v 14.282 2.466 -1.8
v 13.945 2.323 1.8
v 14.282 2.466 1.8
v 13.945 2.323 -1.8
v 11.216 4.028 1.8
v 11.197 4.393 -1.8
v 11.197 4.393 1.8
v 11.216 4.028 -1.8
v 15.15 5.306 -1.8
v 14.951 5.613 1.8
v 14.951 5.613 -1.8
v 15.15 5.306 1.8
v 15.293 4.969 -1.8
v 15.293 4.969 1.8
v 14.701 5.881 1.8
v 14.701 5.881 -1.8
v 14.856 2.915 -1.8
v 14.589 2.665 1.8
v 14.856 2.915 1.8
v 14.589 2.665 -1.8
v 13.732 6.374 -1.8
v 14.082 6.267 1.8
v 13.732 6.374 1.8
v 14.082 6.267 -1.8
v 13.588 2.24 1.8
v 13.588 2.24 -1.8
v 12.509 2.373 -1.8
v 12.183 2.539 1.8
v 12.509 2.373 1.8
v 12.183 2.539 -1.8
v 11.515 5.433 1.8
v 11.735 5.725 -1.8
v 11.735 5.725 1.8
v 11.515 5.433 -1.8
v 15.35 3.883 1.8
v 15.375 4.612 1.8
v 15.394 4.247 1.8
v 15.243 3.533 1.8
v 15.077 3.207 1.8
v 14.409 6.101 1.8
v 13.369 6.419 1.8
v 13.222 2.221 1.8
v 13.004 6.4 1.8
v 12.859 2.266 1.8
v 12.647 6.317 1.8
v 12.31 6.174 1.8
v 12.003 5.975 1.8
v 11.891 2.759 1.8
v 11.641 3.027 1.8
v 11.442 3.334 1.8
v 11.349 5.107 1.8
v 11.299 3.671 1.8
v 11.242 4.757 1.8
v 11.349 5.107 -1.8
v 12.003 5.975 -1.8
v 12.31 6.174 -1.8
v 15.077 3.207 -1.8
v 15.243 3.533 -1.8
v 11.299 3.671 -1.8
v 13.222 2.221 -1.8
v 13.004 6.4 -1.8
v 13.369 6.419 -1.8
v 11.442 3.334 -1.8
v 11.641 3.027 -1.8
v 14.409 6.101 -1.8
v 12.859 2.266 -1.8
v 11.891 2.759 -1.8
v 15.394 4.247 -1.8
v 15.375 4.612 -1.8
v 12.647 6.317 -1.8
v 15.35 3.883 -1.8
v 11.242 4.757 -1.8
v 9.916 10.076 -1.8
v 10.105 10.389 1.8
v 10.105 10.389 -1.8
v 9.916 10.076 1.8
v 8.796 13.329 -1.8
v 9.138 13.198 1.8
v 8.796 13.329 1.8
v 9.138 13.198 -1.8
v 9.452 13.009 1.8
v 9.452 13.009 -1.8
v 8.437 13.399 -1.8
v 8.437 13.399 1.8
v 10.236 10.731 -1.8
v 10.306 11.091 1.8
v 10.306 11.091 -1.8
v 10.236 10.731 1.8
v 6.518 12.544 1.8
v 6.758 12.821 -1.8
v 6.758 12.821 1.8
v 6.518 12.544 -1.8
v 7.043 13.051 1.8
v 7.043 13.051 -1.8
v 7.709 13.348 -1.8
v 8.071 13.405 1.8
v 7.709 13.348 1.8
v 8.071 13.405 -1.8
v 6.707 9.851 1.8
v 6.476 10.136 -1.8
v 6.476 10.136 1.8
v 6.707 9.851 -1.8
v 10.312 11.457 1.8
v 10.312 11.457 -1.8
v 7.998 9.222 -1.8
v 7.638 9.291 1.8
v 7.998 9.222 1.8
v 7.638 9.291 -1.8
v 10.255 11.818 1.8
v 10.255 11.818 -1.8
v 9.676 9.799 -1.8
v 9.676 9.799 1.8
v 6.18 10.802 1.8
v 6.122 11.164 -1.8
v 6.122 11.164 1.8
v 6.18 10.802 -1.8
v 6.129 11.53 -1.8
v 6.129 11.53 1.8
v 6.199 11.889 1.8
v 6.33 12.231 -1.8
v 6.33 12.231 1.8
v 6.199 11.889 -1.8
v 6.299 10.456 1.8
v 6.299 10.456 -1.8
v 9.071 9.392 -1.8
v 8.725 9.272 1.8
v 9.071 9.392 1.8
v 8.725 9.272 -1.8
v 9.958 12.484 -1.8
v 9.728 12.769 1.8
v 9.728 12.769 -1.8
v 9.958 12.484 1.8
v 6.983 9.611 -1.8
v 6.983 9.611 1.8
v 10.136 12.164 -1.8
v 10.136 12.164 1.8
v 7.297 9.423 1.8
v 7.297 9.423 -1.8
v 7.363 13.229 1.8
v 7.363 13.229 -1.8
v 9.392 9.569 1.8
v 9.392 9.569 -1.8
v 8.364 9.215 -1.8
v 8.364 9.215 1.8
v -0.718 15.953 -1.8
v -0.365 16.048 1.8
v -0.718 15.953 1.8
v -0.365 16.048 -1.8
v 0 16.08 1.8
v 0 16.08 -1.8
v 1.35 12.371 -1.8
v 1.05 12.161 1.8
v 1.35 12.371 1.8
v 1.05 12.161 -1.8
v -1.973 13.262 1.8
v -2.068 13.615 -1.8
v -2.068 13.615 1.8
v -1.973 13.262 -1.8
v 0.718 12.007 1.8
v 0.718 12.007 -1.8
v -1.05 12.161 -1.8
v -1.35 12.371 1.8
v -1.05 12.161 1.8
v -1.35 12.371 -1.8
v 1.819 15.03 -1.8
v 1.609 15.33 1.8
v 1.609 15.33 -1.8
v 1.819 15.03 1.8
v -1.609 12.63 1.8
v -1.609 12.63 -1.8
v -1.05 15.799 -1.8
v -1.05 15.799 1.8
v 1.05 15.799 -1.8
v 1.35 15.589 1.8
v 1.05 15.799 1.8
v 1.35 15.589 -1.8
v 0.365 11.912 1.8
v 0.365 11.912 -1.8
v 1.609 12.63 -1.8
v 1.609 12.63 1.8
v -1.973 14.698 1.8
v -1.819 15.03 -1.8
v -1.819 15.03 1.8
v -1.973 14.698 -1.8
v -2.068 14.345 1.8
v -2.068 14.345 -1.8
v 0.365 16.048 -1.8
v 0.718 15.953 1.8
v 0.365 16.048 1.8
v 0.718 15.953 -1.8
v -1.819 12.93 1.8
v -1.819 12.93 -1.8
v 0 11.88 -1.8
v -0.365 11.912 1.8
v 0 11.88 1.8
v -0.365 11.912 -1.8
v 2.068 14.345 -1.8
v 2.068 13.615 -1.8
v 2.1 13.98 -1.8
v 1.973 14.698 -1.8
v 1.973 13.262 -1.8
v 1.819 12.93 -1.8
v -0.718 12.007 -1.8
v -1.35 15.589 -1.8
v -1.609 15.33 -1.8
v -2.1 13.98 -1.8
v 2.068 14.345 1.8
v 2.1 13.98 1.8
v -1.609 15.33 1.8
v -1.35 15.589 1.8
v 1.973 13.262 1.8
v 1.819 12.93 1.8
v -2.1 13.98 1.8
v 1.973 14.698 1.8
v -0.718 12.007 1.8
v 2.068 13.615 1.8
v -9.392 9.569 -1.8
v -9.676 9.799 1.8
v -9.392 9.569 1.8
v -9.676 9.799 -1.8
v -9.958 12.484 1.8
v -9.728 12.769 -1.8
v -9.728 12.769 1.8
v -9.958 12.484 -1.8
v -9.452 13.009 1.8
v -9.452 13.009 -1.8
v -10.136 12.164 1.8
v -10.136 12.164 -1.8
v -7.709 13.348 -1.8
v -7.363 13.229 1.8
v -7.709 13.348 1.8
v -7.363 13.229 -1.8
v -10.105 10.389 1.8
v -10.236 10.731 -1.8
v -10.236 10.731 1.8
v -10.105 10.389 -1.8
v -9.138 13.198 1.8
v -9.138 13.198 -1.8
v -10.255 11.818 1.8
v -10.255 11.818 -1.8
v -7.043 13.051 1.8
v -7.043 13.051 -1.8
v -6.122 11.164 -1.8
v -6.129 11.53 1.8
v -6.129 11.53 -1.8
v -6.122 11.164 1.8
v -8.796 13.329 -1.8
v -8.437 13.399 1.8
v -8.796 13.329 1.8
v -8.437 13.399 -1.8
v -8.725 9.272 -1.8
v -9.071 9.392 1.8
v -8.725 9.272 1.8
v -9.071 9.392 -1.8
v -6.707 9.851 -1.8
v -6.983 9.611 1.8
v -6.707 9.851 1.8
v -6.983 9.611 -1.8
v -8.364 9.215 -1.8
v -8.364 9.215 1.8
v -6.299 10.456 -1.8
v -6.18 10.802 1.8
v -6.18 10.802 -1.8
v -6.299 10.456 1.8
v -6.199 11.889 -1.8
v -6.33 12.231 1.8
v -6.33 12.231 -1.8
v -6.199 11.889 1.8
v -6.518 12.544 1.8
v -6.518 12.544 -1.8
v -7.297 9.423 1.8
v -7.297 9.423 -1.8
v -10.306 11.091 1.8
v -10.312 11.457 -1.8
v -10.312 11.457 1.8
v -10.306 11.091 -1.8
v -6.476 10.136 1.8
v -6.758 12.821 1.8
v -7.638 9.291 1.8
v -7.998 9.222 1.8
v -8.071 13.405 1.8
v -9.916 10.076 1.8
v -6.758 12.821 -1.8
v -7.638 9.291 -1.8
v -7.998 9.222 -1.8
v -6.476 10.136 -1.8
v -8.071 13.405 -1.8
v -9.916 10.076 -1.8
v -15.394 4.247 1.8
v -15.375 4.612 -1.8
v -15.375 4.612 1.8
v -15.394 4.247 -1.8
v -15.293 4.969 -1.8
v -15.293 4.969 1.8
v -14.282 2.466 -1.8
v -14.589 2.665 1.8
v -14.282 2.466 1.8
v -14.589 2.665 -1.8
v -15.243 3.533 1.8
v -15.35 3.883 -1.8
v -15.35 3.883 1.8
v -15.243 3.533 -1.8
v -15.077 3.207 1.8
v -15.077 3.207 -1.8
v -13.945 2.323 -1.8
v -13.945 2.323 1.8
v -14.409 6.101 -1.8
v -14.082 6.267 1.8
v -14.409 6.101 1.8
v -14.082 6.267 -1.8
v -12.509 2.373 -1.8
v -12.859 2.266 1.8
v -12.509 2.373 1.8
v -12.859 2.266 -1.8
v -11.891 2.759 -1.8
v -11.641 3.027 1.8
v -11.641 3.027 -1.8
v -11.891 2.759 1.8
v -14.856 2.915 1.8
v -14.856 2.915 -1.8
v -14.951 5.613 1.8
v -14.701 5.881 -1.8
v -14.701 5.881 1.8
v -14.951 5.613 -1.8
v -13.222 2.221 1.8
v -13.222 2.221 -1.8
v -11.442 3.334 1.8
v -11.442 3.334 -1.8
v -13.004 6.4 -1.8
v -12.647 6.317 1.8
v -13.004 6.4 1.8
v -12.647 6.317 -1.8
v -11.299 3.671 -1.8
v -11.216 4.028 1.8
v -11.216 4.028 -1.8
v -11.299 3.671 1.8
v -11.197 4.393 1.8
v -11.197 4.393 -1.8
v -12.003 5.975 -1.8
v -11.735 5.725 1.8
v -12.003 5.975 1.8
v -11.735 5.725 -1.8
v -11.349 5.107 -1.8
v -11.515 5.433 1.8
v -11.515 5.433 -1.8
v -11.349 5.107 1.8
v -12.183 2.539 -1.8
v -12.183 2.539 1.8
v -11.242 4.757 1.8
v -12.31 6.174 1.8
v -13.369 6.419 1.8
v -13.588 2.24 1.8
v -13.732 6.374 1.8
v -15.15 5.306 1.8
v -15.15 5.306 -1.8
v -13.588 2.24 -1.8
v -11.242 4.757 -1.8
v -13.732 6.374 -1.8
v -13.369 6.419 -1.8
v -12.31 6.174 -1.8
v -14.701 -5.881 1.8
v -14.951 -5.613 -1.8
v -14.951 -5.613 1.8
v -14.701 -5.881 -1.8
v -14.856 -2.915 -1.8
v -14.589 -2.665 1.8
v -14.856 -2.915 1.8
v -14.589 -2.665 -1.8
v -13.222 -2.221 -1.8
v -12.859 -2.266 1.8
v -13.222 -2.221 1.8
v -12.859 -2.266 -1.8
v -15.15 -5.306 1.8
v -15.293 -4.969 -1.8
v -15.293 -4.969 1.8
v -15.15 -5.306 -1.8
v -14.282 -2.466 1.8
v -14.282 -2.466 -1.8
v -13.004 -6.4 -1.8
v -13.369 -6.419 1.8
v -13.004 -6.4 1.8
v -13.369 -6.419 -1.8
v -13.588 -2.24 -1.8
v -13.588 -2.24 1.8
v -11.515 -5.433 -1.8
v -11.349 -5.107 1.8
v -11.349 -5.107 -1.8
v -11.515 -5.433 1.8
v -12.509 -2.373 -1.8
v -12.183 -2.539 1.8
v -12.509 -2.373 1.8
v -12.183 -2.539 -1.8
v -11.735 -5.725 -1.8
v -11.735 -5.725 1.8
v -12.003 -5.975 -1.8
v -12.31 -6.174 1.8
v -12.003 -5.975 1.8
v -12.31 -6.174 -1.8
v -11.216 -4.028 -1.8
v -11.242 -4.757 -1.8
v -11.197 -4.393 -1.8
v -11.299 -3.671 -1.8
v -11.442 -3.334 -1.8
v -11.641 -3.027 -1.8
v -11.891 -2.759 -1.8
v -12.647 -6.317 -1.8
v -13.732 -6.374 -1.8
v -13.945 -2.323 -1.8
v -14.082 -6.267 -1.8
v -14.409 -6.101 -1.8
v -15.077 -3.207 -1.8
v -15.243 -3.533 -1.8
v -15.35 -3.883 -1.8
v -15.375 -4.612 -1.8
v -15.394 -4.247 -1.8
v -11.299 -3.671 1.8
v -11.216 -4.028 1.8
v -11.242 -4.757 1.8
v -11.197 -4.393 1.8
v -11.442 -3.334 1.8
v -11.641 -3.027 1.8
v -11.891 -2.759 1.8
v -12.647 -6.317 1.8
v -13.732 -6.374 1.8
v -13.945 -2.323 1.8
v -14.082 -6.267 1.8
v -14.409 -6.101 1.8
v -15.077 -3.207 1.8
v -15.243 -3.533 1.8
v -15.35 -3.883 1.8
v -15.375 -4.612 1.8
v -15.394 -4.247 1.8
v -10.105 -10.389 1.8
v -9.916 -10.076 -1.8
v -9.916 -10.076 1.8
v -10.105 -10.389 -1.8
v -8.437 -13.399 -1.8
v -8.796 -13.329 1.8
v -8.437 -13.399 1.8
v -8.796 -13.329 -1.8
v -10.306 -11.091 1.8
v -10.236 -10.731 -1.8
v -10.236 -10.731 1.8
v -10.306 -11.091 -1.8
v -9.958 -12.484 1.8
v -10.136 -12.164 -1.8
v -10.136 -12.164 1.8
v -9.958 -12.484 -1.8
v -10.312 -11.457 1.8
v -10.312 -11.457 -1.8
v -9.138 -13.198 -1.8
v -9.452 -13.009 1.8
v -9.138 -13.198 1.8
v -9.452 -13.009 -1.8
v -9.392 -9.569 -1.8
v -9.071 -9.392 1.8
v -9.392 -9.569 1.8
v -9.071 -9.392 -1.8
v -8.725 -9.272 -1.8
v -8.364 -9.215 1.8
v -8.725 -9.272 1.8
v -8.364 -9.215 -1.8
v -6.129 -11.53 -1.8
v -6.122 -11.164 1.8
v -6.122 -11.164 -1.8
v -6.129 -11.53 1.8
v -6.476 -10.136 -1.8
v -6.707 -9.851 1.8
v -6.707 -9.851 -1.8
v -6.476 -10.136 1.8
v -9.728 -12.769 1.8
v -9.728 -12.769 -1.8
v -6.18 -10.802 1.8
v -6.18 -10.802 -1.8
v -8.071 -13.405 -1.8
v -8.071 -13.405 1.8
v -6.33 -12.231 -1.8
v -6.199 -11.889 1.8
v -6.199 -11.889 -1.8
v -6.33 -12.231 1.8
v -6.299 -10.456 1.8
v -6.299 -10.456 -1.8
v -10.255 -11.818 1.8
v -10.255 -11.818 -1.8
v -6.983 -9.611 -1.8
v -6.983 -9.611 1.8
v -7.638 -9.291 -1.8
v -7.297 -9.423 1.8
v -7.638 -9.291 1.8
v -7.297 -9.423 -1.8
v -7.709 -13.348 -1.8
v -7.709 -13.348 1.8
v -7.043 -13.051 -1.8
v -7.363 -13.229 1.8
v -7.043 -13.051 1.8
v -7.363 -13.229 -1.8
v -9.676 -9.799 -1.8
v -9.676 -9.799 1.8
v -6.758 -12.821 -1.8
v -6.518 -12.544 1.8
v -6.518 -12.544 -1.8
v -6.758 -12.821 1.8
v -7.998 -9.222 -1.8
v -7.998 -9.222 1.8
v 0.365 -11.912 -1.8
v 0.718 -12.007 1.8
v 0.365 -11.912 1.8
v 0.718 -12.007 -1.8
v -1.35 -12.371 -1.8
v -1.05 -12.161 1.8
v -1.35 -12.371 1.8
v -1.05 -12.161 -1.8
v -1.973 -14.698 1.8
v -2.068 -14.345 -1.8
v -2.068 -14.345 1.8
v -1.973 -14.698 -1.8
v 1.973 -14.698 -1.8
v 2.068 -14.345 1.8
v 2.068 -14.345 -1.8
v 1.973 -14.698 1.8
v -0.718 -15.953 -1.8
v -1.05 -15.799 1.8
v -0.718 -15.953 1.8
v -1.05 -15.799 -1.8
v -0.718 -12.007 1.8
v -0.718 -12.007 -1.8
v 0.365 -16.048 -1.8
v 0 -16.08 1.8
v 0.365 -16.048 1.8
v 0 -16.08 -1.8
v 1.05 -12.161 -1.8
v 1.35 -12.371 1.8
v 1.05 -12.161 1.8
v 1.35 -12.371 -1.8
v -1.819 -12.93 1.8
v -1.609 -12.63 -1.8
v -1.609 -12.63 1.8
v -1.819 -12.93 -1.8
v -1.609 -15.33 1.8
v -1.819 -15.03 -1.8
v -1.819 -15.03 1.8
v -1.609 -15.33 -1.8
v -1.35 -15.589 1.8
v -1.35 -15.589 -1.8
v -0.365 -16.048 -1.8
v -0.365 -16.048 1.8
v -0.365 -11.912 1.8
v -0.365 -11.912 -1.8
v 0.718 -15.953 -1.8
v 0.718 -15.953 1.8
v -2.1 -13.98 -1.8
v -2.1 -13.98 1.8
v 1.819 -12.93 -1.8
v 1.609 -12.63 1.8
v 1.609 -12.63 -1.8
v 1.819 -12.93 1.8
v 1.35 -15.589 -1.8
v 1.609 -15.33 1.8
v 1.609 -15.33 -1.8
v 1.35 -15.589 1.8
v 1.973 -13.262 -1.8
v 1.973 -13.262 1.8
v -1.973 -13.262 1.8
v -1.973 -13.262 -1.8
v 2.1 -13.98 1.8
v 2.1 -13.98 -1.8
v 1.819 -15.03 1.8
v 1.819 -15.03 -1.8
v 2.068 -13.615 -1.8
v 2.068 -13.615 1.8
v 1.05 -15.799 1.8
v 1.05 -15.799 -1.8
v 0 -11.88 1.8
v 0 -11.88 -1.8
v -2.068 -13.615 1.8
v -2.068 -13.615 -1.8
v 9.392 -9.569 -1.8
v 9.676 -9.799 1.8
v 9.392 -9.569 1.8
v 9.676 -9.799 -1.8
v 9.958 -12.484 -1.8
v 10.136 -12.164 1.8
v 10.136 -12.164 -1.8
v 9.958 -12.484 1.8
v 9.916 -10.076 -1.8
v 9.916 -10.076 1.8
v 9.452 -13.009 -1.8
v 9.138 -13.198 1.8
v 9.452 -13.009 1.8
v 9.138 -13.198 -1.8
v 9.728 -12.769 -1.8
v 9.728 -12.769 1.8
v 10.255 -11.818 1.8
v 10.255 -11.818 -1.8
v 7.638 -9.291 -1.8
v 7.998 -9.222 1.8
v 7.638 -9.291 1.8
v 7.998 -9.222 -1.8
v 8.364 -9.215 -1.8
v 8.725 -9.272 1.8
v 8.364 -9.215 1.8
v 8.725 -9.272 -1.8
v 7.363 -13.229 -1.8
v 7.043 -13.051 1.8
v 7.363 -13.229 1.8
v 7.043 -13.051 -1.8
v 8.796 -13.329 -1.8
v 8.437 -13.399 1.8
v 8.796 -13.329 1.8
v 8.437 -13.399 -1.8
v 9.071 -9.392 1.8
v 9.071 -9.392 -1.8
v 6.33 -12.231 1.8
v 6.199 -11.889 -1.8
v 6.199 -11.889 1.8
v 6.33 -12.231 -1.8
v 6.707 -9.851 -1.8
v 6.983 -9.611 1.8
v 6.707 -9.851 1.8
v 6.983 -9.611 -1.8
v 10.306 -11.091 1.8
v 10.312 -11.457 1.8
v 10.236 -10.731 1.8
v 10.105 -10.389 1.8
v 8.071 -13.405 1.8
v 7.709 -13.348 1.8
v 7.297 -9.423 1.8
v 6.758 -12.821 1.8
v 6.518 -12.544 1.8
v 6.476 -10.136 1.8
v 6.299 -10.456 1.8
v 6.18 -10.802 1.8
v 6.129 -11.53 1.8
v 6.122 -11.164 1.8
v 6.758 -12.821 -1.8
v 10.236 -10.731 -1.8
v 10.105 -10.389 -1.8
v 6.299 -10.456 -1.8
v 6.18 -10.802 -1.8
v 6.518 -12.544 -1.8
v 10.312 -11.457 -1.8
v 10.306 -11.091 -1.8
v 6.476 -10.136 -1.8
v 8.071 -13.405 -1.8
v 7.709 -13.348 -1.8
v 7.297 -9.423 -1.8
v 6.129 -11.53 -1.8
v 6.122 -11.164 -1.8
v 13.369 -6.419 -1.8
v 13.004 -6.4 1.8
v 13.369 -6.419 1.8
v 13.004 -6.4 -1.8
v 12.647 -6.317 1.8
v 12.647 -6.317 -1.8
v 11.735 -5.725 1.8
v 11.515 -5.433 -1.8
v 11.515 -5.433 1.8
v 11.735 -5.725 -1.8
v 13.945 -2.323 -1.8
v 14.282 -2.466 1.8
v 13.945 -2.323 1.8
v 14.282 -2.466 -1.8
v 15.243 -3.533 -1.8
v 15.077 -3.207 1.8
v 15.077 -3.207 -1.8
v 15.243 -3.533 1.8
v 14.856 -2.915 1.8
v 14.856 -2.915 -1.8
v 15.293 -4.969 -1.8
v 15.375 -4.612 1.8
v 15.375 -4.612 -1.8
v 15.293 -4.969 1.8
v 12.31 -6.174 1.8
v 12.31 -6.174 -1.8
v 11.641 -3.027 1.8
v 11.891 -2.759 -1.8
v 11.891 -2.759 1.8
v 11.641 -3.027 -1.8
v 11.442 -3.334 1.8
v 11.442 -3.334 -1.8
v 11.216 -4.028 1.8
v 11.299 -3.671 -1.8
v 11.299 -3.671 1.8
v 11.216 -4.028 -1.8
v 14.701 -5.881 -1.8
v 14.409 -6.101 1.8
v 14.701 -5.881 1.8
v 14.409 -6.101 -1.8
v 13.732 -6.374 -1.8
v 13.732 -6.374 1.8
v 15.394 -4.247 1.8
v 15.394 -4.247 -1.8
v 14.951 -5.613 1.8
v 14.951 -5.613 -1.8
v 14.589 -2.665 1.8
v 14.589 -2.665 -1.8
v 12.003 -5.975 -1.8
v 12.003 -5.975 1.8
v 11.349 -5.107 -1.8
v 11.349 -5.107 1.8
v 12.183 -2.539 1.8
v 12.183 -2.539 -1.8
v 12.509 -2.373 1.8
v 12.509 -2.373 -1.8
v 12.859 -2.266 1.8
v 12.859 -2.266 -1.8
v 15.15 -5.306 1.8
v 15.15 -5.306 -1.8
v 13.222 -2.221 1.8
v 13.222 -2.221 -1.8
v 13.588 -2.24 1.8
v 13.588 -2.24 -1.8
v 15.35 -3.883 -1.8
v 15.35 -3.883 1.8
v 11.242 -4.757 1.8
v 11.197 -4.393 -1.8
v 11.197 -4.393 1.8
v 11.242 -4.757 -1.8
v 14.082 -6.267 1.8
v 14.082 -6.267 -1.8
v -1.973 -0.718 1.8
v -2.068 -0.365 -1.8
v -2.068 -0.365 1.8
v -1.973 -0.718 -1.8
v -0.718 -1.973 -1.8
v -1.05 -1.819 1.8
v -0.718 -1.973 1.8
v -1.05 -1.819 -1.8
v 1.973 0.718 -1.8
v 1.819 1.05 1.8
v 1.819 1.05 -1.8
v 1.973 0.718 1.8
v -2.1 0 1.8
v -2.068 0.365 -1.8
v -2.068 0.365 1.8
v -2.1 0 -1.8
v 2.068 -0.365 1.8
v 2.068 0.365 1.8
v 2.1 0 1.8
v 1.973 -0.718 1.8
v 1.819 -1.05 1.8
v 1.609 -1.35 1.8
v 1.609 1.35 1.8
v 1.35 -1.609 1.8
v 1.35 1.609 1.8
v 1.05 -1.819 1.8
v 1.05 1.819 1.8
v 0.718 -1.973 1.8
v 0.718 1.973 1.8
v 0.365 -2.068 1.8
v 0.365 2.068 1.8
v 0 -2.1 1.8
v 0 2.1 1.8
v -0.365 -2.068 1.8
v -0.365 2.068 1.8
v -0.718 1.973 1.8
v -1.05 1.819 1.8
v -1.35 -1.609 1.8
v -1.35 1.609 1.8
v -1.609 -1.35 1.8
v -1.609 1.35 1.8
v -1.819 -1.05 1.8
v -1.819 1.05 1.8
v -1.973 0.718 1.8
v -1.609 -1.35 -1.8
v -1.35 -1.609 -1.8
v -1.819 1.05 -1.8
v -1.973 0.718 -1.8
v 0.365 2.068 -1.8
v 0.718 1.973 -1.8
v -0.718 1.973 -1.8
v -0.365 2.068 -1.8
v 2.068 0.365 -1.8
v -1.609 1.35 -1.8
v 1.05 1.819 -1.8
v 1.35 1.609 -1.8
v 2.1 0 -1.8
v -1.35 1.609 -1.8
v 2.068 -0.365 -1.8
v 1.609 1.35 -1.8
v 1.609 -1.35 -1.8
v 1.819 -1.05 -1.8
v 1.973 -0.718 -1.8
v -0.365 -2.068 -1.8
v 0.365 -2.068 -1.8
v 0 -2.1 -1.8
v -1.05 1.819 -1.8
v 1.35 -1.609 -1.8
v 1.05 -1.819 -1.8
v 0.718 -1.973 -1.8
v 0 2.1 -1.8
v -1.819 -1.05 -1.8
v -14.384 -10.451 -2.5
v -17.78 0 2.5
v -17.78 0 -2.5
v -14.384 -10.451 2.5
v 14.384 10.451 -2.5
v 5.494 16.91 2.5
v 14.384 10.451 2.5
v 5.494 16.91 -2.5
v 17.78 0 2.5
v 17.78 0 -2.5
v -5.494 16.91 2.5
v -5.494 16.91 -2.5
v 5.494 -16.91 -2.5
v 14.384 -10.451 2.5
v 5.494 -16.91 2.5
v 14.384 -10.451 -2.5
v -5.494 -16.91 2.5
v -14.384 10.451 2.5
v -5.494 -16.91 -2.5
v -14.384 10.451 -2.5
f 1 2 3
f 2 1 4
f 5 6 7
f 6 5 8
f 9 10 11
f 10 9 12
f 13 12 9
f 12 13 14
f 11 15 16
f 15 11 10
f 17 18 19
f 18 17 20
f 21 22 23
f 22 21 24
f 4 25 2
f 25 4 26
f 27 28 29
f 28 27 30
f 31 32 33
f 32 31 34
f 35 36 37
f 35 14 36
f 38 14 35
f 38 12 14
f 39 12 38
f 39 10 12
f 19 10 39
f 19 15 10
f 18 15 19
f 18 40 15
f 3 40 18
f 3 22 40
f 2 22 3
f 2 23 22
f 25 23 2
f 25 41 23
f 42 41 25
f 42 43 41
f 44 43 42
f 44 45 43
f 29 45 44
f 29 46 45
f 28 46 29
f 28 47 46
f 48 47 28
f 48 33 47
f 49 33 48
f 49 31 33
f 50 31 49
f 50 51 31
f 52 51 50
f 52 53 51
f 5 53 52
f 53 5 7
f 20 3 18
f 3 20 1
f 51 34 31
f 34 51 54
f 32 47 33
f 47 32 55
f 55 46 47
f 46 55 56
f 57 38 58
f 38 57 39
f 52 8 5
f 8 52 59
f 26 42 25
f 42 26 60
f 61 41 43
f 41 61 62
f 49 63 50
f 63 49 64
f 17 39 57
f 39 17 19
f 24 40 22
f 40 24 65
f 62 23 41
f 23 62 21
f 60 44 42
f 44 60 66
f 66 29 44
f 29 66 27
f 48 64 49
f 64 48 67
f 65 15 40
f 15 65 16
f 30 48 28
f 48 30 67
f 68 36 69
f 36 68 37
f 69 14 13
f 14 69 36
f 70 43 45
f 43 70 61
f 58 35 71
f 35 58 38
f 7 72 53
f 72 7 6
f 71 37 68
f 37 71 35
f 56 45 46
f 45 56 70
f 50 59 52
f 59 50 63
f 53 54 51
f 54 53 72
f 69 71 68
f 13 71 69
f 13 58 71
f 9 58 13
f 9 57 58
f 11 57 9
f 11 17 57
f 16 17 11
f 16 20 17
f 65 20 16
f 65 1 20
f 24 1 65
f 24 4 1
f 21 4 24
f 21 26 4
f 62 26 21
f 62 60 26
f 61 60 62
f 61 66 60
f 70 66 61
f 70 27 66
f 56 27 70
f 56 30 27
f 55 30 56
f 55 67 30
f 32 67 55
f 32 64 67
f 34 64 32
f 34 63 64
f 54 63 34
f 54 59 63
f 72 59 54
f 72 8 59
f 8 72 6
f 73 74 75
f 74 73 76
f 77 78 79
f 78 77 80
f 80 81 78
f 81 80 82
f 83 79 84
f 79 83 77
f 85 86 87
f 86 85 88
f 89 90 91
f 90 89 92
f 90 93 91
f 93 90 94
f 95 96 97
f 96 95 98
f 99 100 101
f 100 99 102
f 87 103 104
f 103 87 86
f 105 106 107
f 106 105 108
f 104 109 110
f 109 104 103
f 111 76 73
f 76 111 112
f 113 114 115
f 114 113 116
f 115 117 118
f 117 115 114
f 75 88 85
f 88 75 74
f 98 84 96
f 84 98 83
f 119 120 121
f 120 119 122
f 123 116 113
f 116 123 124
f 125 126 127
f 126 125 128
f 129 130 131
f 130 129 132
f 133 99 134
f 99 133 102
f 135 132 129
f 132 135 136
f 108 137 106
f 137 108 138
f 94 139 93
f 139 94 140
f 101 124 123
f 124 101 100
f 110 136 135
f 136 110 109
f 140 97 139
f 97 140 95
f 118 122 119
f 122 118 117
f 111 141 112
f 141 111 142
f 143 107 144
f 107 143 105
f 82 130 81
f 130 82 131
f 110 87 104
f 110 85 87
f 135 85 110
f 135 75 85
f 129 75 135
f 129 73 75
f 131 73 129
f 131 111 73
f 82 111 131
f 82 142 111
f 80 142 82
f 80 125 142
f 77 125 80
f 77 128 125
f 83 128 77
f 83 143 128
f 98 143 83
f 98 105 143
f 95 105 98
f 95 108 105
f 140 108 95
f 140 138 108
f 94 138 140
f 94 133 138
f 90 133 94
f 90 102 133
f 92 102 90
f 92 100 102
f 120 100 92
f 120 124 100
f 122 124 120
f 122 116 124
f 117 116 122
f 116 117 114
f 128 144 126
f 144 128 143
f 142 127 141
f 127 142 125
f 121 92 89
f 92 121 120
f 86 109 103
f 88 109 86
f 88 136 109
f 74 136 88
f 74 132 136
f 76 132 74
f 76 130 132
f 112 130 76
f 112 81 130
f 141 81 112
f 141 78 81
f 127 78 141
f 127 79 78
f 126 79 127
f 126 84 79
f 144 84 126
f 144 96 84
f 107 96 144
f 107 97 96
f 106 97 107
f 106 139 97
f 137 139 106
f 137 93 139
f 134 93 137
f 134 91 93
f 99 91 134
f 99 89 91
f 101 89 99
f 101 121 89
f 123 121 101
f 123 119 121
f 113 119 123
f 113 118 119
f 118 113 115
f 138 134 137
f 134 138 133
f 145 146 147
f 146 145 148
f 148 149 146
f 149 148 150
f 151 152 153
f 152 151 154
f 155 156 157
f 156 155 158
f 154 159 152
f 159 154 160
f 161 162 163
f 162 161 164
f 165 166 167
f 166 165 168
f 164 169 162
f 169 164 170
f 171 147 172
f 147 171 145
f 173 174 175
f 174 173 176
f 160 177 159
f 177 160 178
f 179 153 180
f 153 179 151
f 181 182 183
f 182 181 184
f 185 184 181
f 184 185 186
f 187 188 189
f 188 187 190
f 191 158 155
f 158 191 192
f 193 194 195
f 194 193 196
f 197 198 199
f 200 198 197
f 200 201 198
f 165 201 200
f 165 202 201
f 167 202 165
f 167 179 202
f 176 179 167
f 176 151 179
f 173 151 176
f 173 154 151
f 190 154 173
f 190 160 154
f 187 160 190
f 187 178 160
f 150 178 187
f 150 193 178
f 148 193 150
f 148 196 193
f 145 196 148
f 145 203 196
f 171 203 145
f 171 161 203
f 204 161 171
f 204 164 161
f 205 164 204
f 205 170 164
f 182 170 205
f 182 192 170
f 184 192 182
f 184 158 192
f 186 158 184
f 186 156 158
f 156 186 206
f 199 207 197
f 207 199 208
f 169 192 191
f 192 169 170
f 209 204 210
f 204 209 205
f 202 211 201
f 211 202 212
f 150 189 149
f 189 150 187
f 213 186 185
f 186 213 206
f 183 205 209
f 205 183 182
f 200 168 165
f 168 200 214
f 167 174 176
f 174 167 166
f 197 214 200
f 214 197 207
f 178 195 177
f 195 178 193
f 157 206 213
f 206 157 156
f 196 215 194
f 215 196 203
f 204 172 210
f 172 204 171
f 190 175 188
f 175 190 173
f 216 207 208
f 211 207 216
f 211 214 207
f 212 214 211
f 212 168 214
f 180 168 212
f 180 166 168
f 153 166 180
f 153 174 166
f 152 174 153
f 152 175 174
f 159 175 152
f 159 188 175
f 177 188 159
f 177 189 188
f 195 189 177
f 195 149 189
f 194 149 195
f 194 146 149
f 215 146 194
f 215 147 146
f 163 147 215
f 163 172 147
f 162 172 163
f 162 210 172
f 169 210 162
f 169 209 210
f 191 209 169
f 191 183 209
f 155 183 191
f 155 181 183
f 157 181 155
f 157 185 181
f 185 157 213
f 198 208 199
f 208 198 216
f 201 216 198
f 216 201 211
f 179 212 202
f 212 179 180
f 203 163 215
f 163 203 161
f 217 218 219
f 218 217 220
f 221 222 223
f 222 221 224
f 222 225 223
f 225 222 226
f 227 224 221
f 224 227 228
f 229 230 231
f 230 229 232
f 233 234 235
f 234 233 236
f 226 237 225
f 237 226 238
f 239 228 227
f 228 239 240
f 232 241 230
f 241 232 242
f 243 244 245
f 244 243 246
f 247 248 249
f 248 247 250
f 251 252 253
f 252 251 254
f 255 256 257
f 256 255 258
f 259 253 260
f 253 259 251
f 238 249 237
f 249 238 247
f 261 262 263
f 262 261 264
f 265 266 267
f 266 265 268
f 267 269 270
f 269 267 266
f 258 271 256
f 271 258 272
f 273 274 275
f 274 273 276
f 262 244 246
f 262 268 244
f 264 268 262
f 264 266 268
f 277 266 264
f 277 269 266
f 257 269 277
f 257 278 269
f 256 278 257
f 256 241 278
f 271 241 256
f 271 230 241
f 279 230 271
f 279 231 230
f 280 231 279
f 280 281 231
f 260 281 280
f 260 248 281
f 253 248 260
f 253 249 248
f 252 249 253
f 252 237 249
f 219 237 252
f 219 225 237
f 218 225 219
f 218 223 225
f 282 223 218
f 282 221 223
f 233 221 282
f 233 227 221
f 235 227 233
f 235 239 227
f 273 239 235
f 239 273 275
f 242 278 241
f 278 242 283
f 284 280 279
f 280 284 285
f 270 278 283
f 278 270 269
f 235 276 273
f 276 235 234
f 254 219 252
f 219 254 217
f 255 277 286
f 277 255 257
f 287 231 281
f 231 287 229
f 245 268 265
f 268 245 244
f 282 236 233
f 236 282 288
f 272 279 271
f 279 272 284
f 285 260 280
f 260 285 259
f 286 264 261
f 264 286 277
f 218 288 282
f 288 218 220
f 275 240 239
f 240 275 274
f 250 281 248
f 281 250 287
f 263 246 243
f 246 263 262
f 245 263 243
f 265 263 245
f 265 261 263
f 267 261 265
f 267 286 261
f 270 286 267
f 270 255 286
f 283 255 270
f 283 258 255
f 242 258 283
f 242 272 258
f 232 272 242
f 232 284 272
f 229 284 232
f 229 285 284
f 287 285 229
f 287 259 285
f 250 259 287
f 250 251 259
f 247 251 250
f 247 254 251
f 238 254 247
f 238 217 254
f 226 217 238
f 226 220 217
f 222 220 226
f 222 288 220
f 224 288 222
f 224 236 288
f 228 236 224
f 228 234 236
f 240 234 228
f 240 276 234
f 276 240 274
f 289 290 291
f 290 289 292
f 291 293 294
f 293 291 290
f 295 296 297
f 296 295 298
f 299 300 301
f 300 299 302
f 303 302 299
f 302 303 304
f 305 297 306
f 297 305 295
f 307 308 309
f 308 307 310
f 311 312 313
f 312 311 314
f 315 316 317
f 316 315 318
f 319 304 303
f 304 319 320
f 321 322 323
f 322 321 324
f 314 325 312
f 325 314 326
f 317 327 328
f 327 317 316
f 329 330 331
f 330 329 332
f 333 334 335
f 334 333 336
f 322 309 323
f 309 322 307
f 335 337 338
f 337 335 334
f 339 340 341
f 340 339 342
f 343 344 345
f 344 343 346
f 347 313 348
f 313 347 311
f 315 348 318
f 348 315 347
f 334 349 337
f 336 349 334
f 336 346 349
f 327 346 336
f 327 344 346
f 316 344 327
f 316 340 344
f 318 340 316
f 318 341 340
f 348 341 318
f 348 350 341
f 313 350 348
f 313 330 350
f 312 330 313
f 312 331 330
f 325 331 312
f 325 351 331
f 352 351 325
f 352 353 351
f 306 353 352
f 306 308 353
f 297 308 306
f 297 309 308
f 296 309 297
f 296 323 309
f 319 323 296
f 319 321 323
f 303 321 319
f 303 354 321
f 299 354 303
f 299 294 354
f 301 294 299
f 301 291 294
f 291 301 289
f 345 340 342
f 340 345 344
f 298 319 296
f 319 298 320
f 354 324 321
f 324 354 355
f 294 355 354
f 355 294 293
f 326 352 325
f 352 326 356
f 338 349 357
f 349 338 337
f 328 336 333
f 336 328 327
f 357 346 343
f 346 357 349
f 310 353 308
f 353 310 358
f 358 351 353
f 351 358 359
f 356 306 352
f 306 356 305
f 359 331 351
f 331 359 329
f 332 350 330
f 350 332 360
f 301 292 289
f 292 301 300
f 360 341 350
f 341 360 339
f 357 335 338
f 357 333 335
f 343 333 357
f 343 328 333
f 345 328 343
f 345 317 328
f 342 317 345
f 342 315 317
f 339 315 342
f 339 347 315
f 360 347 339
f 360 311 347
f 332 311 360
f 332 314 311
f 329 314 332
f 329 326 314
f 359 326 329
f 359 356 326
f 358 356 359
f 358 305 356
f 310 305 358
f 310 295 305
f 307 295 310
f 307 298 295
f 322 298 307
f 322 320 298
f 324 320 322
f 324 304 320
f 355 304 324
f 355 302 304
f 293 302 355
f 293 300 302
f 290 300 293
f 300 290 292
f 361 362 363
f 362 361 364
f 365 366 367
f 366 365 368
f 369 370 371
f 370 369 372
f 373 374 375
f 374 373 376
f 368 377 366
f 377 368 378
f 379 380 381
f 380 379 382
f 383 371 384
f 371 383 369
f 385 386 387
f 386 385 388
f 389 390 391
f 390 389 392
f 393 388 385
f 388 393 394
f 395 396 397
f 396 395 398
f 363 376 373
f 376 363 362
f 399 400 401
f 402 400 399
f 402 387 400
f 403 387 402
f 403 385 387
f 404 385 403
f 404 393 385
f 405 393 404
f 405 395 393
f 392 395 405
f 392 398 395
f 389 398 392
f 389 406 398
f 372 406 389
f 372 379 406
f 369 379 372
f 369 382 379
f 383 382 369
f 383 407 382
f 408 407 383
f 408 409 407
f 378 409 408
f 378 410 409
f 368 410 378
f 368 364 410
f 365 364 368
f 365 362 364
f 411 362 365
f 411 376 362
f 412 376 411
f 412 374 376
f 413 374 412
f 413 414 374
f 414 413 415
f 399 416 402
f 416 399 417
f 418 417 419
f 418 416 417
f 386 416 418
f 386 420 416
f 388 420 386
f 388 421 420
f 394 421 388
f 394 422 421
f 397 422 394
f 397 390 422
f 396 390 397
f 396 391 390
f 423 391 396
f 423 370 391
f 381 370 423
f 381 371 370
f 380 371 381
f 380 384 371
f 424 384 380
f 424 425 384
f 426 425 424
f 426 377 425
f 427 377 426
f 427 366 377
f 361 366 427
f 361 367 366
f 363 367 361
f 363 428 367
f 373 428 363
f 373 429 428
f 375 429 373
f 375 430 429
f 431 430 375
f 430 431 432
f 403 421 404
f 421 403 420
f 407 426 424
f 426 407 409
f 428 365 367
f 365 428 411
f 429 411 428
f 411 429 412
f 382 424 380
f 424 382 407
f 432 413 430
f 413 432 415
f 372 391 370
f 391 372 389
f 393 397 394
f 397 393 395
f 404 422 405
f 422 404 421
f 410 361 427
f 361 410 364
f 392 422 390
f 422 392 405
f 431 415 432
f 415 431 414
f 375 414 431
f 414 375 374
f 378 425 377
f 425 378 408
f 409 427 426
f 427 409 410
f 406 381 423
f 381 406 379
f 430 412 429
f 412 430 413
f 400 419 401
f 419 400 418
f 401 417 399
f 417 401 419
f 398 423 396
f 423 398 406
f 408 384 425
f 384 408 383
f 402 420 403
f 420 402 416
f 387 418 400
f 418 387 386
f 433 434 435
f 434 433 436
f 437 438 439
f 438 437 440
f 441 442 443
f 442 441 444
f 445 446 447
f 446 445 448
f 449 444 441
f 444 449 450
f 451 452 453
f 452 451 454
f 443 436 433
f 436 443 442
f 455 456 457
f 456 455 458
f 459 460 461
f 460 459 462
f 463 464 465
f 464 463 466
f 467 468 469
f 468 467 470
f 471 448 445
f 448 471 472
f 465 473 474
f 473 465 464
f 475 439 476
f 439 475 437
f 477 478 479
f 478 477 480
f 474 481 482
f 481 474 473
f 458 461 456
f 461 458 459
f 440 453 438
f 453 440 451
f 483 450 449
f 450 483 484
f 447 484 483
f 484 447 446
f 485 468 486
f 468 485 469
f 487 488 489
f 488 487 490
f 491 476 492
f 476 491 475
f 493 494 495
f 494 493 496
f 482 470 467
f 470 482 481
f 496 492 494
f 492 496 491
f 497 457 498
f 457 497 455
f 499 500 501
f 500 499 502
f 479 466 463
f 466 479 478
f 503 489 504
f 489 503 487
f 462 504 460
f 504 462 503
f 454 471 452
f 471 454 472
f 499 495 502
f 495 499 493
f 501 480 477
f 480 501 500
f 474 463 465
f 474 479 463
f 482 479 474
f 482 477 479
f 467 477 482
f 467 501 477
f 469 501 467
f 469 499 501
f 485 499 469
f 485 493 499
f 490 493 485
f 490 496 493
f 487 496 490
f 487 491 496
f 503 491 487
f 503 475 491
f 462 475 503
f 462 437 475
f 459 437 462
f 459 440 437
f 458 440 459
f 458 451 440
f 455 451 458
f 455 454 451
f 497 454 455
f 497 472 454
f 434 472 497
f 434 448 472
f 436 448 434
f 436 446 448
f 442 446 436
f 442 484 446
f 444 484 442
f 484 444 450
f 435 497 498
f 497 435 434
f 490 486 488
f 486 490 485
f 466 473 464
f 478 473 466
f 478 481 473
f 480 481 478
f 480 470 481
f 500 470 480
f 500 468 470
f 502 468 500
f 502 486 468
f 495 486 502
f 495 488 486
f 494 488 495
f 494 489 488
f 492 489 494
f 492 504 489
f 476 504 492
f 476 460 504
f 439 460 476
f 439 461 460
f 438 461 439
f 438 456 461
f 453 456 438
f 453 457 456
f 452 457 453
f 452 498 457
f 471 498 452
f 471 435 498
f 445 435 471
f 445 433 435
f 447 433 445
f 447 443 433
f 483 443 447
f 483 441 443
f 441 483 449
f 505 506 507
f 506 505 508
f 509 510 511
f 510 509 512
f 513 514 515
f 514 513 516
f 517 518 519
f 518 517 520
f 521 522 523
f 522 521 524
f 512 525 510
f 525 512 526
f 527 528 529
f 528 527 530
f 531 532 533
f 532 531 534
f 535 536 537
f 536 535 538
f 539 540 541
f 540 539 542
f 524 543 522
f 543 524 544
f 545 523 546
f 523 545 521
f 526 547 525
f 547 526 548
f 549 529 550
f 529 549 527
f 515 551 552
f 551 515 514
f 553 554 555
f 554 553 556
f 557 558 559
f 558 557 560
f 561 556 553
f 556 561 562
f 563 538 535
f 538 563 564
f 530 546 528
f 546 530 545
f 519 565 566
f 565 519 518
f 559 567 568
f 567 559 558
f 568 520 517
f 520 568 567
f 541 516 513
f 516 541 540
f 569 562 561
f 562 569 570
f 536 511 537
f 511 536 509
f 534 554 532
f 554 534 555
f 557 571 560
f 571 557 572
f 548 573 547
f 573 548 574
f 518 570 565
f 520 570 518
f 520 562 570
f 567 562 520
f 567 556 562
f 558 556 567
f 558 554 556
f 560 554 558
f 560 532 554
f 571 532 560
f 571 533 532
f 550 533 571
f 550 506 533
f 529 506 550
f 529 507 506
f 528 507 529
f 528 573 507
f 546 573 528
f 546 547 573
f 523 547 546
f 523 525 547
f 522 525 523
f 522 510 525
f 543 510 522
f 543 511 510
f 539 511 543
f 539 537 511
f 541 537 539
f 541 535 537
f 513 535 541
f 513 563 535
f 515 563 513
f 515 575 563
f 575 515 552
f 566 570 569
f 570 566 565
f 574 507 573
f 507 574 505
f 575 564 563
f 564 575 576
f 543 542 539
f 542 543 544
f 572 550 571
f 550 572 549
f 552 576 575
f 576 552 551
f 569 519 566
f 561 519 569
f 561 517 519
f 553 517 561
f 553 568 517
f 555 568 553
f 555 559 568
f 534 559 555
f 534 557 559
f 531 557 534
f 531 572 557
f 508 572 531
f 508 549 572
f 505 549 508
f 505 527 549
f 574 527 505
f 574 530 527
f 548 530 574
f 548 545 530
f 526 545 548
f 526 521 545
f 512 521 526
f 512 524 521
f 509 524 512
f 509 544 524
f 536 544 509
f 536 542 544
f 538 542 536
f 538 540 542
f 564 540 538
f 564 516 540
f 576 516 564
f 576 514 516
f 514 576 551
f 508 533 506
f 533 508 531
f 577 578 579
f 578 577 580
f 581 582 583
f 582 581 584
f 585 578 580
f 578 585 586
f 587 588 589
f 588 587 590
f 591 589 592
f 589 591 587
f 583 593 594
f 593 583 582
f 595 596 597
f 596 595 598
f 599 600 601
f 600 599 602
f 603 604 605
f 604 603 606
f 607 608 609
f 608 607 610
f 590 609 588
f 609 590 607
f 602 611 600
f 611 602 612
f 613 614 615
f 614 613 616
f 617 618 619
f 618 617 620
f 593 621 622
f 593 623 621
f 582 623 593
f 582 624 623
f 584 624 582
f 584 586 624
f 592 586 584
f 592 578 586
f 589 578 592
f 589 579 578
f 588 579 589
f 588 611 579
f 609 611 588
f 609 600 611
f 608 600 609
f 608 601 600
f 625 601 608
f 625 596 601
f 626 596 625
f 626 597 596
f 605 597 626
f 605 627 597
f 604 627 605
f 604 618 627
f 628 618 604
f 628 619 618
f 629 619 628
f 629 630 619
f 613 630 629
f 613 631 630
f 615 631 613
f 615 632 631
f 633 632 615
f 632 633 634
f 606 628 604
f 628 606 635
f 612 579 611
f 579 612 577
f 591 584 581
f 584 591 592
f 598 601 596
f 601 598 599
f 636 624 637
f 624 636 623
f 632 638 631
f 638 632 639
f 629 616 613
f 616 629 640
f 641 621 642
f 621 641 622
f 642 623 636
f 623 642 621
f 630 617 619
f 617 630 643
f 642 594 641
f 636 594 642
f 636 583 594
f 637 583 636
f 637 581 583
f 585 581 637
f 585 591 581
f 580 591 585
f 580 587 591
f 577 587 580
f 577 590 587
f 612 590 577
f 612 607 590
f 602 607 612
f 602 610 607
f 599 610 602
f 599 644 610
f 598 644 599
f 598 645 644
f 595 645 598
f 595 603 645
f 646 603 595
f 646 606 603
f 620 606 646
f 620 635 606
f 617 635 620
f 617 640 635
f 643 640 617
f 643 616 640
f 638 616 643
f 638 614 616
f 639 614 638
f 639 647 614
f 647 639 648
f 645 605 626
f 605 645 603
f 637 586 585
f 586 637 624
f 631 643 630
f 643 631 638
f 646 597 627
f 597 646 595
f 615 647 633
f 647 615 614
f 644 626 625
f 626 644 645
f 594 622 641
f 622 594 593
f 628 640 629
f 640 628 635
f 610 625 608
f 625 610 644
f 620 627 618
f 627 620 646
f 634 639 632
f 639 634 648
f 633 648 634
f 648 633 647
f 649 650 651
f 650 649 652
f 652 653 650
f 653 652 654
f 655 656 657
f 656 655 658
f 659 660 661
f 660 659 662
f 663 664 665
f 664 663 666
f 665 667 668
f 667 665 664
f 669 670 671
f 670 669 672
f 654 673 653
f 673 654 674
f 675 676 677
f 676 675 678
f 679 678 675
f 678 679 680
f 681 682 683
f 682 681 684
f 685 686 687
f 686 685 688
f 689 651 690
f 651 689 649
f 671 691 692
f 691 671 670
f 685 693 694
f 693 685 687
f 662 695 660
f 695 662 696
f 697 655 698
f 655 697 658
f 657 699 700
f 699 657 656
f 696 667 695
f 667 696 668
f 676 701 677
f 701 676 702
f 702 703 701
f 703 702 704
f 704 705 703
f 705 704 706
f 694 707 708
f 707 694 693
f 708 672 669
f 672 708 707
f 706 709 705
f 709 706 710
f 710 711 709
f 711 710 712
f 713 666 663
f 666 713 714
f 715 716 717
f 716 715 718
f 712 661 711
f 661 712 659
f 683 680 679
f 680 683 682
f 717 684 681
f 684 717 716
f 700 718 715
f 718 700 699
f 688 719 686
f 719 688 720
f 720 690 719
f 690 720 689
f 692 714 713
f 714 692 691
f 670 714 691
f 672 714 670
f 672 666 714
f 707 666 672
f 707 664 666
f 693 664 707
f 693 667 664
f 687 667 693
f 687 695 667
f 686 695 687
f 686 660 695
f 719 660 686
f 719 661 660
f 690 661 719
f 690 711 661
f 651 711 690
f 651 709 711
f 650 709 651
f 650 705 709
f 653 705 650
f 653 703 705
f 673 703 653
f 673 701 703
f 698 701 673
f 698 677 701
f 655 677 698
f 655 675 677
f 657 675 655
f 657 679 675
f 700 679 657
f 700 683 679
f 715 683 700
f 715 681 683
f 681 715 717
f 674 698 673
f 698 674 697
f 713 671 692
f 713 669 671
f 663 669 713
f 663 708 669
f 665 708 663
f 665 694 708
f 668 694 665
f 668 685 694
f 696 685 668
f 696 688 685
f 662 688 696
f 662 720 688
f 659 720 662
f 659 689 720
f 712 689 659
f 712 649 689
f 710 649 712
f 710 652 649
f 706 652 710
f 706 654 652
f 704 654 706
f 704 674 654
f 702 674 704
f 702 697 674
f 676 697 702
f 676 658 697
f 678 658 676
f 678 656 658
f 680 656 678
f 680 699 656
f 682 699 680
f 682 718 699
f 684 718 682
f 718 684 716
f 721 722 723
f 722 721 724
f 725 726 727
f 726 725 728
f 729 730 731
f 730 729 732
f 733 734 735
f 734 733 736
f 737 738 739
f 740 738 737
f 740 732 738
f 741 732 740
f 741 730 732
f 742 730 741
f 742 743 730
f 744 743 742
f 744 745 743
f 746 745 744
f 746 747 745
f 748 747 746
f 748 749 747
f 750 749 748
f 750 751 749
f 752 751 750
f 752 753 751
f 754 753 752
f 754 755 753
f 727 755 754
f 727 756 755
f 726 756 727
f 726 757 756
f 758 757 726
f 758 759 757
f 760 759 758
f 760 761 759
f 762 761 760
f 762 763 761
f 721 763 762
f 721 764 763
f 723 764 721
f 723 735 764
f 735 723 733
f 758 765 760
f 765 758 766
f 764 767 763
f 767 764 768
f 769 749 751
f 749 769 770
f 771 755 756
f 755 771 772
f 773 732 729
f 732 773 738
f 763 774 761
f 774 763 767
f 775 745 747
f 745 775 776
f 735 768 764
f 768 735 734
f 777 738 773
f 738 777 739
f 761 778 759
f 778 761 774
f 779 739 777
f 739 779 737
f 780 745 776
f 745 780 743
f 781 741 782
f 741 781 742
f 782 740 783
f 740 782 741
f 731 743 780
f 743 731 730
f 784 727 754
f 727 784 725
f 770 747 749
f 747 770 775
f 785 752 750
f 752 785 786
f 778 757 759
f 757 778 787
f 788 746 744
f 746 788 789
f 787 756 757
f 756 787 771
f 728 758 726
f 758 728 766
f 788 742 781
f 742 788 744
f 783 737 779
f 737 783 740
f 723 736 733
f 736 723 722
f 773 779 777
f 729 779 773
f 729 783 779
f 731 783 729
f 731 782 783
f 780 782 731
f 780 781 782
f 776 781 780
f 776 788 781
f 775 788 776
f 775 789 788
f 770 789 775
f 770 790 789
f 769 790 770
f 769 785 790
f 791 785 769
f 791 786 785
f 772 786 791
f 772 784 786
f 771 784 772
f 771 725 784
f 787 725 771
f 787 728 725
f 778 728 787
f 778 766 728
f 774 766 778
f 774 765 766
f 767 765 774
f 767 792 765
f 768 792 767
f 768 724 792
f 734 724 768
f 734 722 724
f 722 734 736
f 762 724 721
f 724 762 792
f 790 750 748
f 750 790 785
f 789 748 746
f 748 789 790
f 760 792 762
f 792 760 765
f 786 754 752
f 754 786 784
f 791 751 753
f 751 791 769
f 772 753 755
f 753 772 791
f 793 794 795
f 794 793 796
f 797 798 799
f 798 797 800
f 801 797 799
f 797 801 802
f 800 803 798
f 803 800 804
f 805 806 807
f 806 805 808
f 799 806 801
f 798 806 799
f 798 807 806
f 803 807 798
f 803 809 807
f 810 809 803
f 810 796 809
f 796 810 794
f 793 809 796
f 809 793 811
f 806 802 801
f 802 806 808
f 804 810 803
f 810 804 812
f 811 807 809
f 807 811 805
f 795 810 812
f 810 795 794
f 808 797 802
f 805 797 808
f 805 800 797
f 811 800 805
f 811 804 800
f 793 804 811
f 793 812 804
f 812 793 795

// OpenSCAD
// decagon.scad

inch = 25.4;
h = 5; // height unit, 5mm
o2 = 0.2;
br = 1.7; // ball radius

r = inch * 0.7; // radius
echo("radius:", r);
echo("diameter:", 2 * r);
echo("side:", 2 * r * sin(360 / 10 / 2));

module balcyl(deeper=false) {

  hf = 2;
  h = br * hf + o2;

  cylinder(r=br + 2 * o2, h=h, center=true, $fn=36);
}

difference() {
  cylinder(h=h, r=r, center=true, $fn=10);
  union() {
    balcyl();
    for(a = [ 360/20 : 360/10 : 360 ]) {
      //echo(a);
      rotate([ 0, 0, a ]) translate([ r - br * 2 - 2 * o2, 0, 0 ]) balcyl();
    }
  }
}
